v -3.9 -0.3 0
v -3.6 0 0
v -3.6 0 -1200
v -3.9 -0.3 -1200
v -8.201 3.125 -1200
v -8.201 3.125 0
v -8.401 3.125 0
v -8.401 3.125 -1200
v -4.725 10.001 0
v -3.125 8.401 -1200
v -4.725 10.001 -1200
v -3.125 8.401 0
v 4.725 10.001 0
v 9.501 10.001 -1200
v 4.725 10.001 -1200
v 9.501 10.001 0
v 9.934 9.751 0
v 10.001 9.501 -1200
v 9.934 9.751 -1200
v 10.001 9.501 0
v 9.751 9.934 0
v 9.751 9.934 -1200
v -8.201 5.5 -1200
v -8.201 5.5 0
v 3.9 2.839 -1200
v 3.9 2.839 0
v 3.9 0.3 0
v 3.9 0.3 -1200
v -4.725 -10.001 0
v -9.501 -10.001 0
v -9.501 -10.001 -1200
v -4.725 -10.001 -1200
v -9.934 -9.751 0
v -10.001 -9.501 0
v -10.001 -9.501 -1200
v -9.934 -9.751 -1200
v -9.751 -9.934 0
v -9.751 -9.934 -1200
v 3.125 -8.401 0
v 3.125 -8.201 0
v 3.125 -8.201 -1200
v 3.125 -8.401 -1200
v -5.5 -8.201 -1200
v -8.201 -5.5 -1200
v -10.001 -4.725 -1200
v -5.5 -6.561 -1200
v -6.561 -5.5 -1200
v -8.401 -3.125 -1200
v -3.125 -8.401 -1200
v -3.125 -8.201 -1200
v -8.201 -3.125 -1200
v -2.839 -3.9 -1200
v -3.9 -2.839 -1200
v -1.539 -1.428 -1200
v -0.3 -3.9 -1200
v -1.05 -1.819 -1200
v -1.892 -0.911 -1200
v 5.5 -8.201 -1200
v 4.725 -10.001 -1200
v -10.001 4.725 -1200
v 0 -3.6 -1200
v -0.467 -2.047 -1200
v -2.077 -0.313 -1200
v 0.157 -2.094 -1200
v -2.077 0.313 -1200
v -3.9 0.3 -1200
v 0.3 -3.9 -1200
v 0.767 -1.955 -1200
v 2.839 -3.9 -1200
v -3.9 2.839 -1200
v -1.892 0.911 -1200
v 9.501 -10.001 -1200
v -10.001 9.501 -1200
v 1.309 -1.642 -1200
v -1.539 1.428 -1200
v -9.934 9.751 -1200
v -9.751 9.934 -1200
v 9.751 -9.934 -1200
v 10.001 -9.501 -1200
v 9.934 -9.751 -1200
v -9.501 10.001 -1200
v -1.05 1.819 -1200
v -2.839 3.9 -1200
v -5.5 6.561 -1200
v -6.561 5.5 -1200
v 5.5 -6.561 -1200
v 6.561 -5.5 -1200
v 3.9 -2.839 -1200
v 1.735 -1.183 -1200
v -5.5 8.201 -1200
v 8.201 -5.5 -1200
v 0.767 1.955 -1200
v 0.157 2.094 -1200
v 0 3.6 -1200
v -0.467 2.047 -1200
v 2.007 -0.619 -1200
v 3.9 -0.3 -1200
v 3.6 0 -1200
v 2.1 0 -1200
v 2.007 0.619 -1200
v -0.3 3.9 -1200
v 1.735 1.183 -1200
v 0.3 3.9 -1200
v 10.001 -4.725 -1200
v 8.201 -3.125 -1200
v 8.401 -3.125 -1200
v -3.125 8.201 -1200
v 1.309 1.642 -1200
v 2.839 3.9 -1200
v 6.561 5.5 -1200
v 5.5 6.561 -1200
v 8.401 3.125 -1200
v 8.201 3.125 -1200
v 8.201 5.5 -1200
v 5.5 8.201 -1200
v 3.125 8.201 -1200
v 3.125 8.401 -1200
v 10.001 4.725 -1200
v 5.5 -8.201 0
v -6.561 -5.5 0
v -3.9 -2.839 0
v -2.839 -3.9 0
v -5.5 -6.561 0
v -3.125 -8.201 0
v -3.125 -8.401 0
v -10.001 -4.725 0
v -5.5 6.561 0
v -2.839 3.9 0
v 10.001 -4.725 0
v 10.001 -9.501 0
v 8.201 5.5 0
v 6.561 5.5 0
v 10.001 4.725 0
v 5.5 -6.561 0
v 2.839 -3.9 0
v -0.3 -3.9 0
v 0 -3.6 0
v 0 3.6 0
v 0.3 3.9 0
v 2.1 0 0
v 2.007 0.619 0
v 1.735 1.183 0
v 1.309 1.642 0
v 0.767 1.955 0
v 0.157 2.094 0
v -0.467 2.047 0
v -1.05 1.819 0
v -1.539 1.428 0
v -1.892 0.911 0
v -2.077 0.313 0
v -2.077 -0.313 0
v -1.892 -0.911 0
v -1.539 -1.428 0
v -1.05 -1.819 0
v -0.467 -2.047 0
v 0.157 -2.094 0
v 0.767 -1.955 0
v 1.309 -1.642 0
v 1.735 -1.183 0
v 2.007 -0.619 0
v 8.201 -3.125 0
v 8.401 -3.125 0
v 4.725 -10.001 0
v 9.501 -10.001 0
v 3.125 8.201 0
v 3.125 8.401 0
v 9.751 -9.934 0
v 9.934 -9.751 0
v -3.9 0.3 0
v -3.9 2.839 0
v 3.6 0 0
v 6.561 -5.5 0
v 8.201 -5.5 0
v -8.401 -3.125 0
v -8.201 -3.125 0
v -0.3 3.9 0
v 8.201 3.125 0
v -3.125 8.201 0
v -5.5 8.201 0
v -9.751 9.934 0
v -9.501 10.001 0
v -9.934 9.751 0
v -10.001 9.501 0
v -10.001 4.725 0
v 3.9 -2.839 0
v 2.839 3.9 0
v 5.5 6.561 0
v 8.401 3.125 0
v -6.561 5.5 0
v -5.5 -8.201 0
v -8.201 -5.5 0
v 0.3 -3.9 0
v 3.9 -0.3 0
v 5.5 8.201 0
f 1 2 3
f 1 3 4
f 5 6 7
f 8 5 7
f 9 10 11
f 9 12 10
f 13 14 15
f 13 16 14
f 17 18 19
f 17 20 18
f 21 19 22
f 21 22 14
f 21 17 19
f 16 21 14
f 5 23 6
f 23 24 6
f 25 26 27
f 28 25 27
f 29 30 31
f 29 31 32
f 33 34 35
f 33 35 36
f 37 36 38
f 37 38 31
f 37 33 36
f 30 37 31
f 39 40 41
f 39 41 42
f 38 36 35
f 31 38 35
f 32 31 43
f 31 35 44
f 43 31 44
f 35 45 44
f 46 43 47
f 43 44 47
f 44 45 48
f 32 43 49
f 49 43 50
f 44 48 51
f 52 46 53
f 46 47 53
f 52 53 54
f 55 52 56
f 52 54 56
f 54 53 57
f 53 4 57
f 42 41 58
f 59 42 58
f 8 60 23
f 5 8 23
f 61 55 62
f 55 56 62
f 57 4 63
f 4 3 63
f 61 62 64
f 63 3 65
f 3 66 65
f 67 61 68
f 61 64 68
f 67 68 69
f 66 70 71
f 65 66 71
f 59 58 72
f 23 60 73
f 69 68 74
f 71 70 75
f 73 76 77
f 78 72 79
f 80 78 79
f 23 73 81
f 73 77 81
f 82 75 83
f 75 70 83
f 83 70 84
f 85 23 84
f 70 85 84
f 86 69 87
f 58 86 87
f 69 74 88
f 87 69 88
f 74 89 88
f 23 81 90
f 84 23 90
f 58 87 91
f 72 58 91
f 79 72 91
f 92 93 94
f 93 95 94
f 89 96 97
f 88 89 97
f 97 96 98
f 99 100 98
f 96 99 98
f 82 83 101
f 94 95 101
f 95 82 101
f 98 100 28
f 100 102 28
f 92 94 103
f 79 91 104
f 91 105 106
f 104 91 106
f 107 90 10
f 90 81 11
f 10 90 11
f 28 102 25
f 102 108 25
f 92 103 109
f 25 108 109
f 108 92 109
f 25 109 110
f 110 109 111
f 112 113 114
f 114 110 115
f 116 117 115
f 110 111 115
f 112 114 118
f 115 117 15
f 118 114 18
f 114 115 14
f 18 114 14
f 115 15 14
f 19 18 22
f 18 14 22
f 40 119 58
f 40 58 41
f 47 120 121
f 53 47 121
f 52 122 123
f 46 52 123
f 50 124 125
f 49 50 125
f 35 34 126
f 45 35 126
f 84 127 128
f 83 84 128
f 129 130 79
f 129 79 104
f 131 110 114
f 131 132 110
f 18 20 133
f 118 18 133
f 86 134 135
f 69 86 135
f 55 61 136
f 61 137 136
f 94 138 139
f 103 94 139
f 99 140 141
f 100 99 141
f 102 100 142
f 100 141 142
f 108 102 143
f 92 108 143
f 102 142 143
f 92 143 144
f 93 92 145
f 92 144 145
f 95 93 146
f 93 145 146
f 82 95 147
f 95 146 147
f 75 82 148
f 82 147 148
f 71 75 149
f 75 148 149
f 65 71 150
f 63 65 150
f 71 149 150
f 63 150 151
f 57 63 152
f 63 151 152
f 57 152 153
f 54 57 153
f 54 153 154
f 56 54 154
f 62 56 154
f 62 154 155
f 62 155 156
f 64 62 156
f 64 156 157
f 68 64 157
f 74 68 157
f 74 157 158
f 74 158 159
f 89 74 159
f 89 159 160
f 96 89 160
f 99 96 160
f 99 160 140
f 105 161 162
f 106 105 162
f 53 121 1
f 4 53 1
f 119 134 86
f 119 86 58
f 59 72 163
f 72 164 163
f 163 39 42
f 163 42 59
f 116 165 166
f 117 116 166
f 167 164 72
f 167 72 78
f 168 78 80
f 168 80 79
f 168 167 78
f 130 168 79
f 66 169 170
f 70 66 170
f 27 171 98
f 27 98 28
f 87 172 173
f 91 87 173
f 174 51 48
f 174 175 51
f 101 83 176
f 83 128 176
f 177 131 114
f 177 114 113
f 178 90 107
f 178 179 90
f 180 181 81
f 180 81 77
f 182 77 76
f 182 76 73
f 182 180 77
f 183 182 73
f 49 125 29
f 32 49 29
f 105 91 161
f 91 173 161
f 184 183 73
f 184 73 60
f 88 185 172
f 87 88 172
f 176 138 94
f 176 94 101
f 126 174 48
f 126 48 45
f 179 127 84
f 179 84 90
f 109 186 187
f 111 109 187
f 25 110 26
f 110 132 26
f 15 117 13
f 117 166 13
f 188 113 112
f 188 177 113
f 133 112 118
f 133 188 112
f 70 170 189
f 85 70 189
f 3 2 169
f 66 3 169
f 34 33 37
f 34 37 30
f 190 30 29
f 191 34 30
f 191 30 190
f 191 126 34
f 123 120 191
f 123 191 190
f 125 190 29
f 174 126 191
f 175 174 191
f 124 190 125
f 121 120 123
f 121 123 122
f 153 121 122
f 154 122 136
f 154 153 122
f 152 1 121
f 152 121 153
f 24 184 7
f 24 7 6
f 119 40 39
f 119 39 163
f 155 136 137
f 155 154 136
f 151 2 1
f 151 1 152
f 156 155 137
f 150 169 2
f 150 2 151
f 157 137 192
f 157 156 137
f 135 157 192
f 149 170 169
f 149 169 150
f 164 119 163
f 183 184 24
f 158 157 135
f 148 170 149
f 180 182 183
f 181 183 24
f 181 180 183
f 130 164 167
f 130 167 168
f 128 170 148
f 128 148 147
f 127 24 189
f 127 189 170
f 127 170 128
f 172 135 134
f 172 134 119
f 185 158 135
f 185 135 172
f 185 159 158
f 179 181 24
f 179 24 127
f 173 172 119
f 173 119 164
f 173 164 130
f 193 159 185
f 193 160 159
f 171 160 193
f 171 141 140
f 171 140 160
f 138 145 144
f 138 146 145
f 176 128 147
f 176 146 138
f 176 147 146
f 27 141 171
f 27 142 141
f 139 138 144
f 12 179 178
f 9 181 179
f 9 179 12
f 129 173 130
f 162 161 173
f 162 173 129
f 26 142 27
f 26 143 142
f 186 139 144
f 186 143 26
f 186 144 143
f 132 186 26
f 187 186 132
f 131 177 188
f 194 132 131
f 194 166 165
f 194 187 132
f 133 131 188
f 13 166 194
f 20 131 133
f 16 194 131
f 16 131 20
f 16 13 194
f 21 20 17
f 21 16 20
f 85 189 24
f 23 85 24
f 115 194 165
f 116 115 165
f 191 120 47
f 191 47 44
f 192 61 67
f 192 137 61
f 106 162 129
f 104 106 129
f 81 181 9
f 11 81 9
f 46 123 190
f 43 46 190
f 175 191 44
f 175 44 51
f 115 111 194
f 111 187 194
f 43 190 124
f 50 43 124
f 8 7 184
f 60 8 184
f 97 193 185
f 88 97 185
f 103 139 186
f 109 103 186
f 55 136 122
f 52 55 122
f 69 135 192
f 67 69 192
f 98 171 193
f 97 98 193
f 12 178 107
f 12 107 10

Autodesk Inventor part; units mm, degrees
ref_plane "YZ Plane" through (0, 0, 0) normal (1, 0, 0) x (0, 1, 0)
ref_plane "XZ Plane" through (0, 0, 0) normal (0, 1, 0) x (-1, 0, 0)
ref_plane "XY Plane" through (0, 0, 0) normal (0, 0, 1) x (1, 0, 0)
sketch "Sketch2" plane through (0, 0, 0) normal (0, 0, 1) x (1, 0, 0)
  arc A0 (-27.4375, 16.3608) -> (-26.9375, 16.8608) centre (-27.4375, 16.8608) ccw
  line L0 (-45.4375, 36.3608) -> (-46.4375, 36.3608)
  line L1 (-46.9375, 34.8608) -> (-46.9375, 35.8608)
  line L2 (-28.4375, 36.3608) -> (-27.4375, 36.3608)
  line L3 (-26.9375, 17.8608) -> (-26.9375, 16.8608)
  line L4 (-28.4375, 16.3608) -> (-27.4375, 16.3608)
  line L5 (-26.9375, 31.1923) -> (-26.9375, 35.8608)
  line L6 (-46.4375, 16.3608) -> (-41.7689, 16.3608)
  line L7 (-46.9375, 17.8608) -> (-46.9375, 16.8608)
  arc A1 (-46.9375, 16.8608) -> (-46.4375, 16.3608) centre (-46.4375, 16.8608) ccw
  arc A2 (-46.9375, 16.8608) -> (-46.4375, 16.3608) centre (-46.4375, 16.8608) ccw
  arc A3 (-46.4375, 36.3608) -> (-46.9375, 35.8608) centre (-46.4375, 35.8608) ccw
  arc A4 (-26.9375, 35.8608) -> (-27.4375, 36.3608) centre (-27.4375, 35.8608) ccw
  line L8 (-41.5004, 36.2982) -> (-41.5366, 36.3146)
  line L9 (-46.812, 30.8227) -> (-46.8352, 30.855)
  line L10 (-46.9375, 17.8608) -> (-46.9375, 21.4608)
  line L11 (-46.9362, 21.5691) -> (-46.9375, 21.4608)
  line L12 (-46.9258, 21.6478) -> (-46.9323, 21.6086)
  line L13 (-46.9323, 21.6086) -> (-46.9362, 21.5691)
  line L14 (-46.9168, 21.6865) -> (-46.9258, 21.6478)
  line L15 (-46.9053, 21.7245) -> (-46.9168, 21.6865)
  line L16 (-46.8913, 21.7617) -> (-46.9053, 21.7245)
  line L17 (-46.8749, 21.7979) -> (-46.8913, 21.7617)
  line L18 (-46.8561, 21.8329) -> (-46.8749, 21.7979)
  line L19 (-46.812, 21.8989) -> (-46.8352, 21.8667)
  line L20 (-46.8352, 21.8667) -> (-46.8561, 21.8329)
  line L21 (-41.4654, 36.2795) -> (-41.5004, 36.2982)
  line L22 (-46.7868, 21.9297) -> (-46.812, 21.8989)
  line L23 (-46.7597, 21.9586) -> (-46.7868, 21.9297)
  line L24 (-46.7597, 21.9586) -> (-45.2441, 23.4742)
  line L25 (-45.2441, 23.4742) -> (-45.1375, 23.4742)
  line L26 (-45.1375, 23.4742) -> (-45.1375, 20.8608)
  line L27 (-45.1375, 20.8608) -> (-43.4981, 20.8608)
  line L28 (-43.4981, 20.8608) -> (-40.8375, 23.5215)
  line L29 (-46.7868, 30.792) -> (-46.812, 30.8227)
  line L30 (-40.8375, 26.161) -> (-40.8375, 23.5215)
  line L31 (-40.6376, 26.3608) -> (-40.8375, 26.161)
  line L32 (-40.6376, 26.3608) -> (-40.8375, 26.5607)
  line L33 (-40.8375, 29.2002) -> (-40.8375, 26.5607)
  line L34 (-43.4981, 31.8608) -> (-40.8375, 29.2002)
  line L35 (-45.1375, 31.8608) -> (-43.4981, 31.8608)
  line L36 (-45.1375, 29.2475) -> (-45.1375, 31.8608)
  line L37 (-46.7597, 30.763) -> (-46.7868, 30.792)
  line L38 (-45.2441, 29.2475) -> (-45.1375, 29.2475)
  line L39 (-45.2441, 29.2475) -> (-46.7597, 30.763)
  line L40 (-28.7375, 20.8608) -> (-30.3768, 20.8608)
  line L41 (-41.5738, 36.3286) -> (-41.6118, 36.3402)
  line L42 (-41.3687, 36.2102) -> (-41.3994, 36.2354)
  line L43 (-41.3397, 36.183) -> (-41.3687, 36.2102)
  line L44 (-41.6118, 36.3402) -> (-41.6505, 36.3492)
  line L45 (-41.7292, 16.3621) -> (-41.7689, 16.3608)
  line L46 (-41.6897, 16.366) -> (-41.7292, 16.3621)
  line L47 (-41.6505, 16.3725) -> (-41.6897, 16.366)
  line L48 (-41.6118, 16.3815) -> (-41.6505, 16.3725)
  line L49 (-41.5738, 16.3931) -> (-41.6118, 16.3815)
  line L50 (-41.5366, 16.4071) -> (-41.5738, 16.3931)
  line L51 (-42.4375, 32.9215) -> (-39.7768, 30.2608)
  line L52 (-41.5004, 16.4235) -> (-41.5366, 16.4071)
  line L53 (-41.4654, 16.4422) -> (-41.5004, 16.4235)
  line L54 (-41.4317, 16.4632) -> (-41.4654, 16.4422)
  line L55 (-41.3994, 16.4863) -> (-41.4317, 16.4632)
  line L56 (-41.3687, 16.5115) -> (-41.3994, 16.4863)
  line L57 (-41.3397, 16.5386) -> (-41.3687, 16.5115)
  line L58 (-41.3397, 16.5386) -> (-39.8241, 18.0542)
  line L59 (-39.8241, 18.0542) -> (-39.8241, 18.1608)
  line L60 (-39.8241, 18.1608) -> (-42.4375, 18.1608)
  line L61 (-42.4375, 18.1608) -> (-42.4375, 19.8002)
  line L62 (-42.4375, 19.8002) -> (-39.7768, 22.4608)
  line L63 (-39.7768, 22.4608) -> (-37.1444, 22.4608)
  line L64 (-37.1444, 22.4608) -> (-36.9375, 22.6656)
  line L65 (-36.9375, 22.6656) -> (-36.7327, 22.4608)
  line L66 (-36.7327, 22.4608) -> (-34.0981, 22.4608)
  line L67 (-34.0981, 22.4608) -> (-31.4375, 19.8002)
  line L68 (-31.4375, 18.1608) -> (-31.4375, 19.8002)
  line L69 (-41.3397, 36.183) -> (-39.8241, 34.6675)
  line L70 (-34.0508, 18.1608) -> (-31.4375, 18.1608)
  line L71 (-41.6505, 36.3492) -> (-41.6897, 36.3557)
  line L72 (-34.0508, 18.0542) -> (-34.0508, 18.1608)
  line L73 (-34.0508, 18.0542) -> (-32.5353, 16.5387)
  line L74 (-32.5353, 16.5387) -> (-32.5063, 16.5115)
  line L75 (-32.5063, 16.5115) -> (-32.4756, 16.4863)
  line L76 (-32.4756, 16.4863) -> (-32.4433, 16.4632)
  line L77 (-32.4433, 16.4632) -> (-32.4096, 16.4422)
  line L78 (-32.4096, 16.4422) -> (-32.3745, 16.4235)
  line L79 (-32.3745, 16.4235) -> (-32.3383, 16.4071)
  line L80 (-32.3383, 16.4071) -> (-32.3012, 16.3931)
  line L81 (-32.3012, 16.3931) -> (-32.2631, 16.3815)
  line L82 (-32.2631, 16.3815) -> (-32.2245, 16.3725)
  line L83 (-32.2245, 16.3725) -> (-32.1853, 16.366)
  line L84 (-32.1853, 16.366) -> (-32.1457, 16.3621)
  line L85 (-32.1457, 16.3621) -> (-32.106, 16.3608)
  line L86 (-28.4375, 16.3608) -> (-32.106, 16.3608)
  line L87 (-39.8241, 34.6675) -> (-39.8241, 34.5608)
  line L88 (-41.6897, 36.3557) -> (-41.7292, 36.3595)
  line L89 (-26.9375, 17.8608) -> (-26.9375, 21.5294)
  line L90 (-26.9388, 21.5691) -> (-26.9375, 21.5294)
  line L91 (-26.9427, 21.6086) -> (-26.9388, 21.5691)
  line L92 (-26.9491, 21.6478) -> (-26.9427, 21.6086)
  line L93 (-26.9582, 21.6865) -> (-26.9491, 21.6478)
  line L94 (-26.9697, 21.7245) -> (-26.9582, 21.6865)
  line L95 (-26.9837, 21.7617) -> (-26.9697, 21.7245)
  line L96 (-27.0001, 21.7979) -> (-26.9837, 21.7617)
  line L97 (-41.7292, 36.3595) -> (-41.7689, 36.3608)
  line L98 (-27.0188, 21.8329) -> (-27.0001, 21.7979)
  line L99 (-27.0398, 21.8667) -> (-27.0188, 21.8329)
  line L100 (-27.0629, 21.8989) -> (-27.0398, 21.8667)
  line L101 (-27.0881, 21.9297) -> (-27.0629, 21.8989)
  line L102 (-27.1153, 21.9587) -> (-27.0881, 21.9297)
  line L103 (-28.6308, 23.4742) -> (-27.1153, 21.9587)
  line L104 (-28.6308, 23.4742) -> (-28.7375, 23.4742)
  line L105 (-28.7375, 23.4742) -> (-28.7375, 20.8608)
  line L106 (-32.3012, 36.3286) -> (-32.2631, 36.3402)
  line L107 (-30.3768, 20.8608) -> (-33.0375, 23.5215)
  line L108 (-33.0375, 23.5215) -> (-33.0375, 26.161)
  line L109 (-33.2373, 26.3608) -> (-33.0375, 26.161)
  line L110 (-33.2373, 26.3608) -> (-33.0375, 26.5607)
  line L111 (-33.0375, 29.2002) -> (-33.0375, 26.5607)
  line L112 (-30.3768, 31.8608) -> (-33.0375, 29.2002)
  line L113 (-45.4375, 36.3608) -> (-41.7689, 36.3608)
  line L114 (-28.6308, 29.2475) -> (-28.7375, 29.2475)
  line L115 (-28.7375, 31.8608) -> (-30.3768, 31.8608)
  line L116 (-28.7375, 29.2475) -> (-28.7375, 31.8608)
  line L117 (-27.1153, 30.763) -> (-28.6308, 29.2475)
  line L118 (-27.1153, 30.763) -> (-27.0881, 30.792)
  line L119 (-27.0881, 30.792) -> (-27.0629, 30.8227)
  line L120 (-27.0629, 30.8227) -> (-27.0398, 30.855)
  line L121 (-27.0398, 30.855) -> (-27.0188, 30.8888)
  line L122 (-27.0188, 30.8888) -> (-27.0001, 30.9238)
  line L123 (-27.0001, 30.9238) -> (-26.9837, 30.96)
  line L124 (-26.9837, 30.96) -> (-26.9697, 30.9972)
  line L125 (-26.9697, 30.9972) -> (-26.9582, 31.0352)
  line L126 (-26.9582, 31.0352) -> (-26.9491, 31.0739)
  line L127 (-26.9491, 31.0739) -> (-26.9427, 31.1131)
  line L128 (-26.9427, 31.1131) -> (-26.9388, 31.1526)
  line L129 (-26.9388, 31.1526) -> (-26.9375, 31.1923)
  line L130 (-39.8241, 34.5608) -> (-42.4375, 34.5608)
  line L131 (-28.4375, 36.3608) -> (-32.106, 36.3608)
  line L132 (-32.1457, 36.3595) -> (-32.106, 36.3608)
  line L133 (-32.1853, 36.3557) -> (-32.1457, 36.3595)
  line L134 (-32.2631, 36.3402) -> (-32.2245, 36.3492)
  line L135 (-32.3383, 36.3146) -> (-32.3012, 36.3286)
  line L136 (-32.3745, 36.2982) -> (-32.3383, 36.3146)
  line L137 (-32.4096, 36.2795) -> (-32.3745, 36.2982)
  line L138 (-32.4433, 36.2585) -> (-32.4096, 36.2795)
  line L139 (-32.4756, 36.2354) -> (-32.4433, 36.2585)
  line L140 (-32.5063, 36.2102) -> (-32.4756, 36.2354)
  line L141 (-46.9323, 31.1131) -> (-46.9362, 31.1526)
  line L142 (-34.0508, 34.6675) -> (-32.5353, 36.183)
  line L143 (-34.0508, 34.6675) -> (-34.0508, 34.5608)
  line L144 (-34.0508, 34.5608) -> (-31.4375, 34.5608)
  line L145 (-31.4375, 34.5608) -> (-31.4375, 32.9215)
  line L146 (-34.0981, 30.2608) -> (-31.4375, 32.9215)
  line L147 (-34.0981, 30.2608) -> (-36.7327, 30.2608)
  line L148 (-42.4375, 34.5608) -> (-42.4375, 32.9215)
  line L149 (-36.7327, 30.2608) -> (-36.9375, 30.0561)
  line L150 (-37.1422, 30.2608) -> (-36.9375, 30.0561)
  line L151 (-39.7768, 30.2608) -> (-37.1422, 30.2608)
  line L152 (-32.5353, 36.183) -> (-32.5063, 36.2102)
  line L153 (-41.3994, 36.2354) -> (-41.4317, 36.2585)
  line L154 (-46.9258, 31.0739) -> (-46.9323, 31.1131)
  line L155 (-41.4317, 36.2585) -> (-41.4654, 36.2795)
  line L156 (-46.9362, 31.1526) -> (-46.9375, 31.2608)
  line L157 (-46.9168, 31.0352) -> (-46.9258, 31.0739)
  line L158 (-46.9375, 34.8608) -> (-46.9375, 31.2608)
  line L159 (-46.9053, 30.9972) -> (-46.9168, 31.0352)
  line L160 (-46.8913, 30.96) -> (-46.9053, 30.9972)
  line L161 (-46.8749, 30.9238) -> (-46.8913, 30.96)
  line L162 (-46.8561, 30.8888) -> (-46.8749, 30.9238)
  line L163 (-32.2245, 36.3492) -> (-32.1853, 36.3557)
  line L164 (-41.5366, 36.3146) -> (-41.5738, 36.3286)
  line L165 (-46.8352, 30.855) -> (-46.8561, 30.8888)
  circle A5 centre (-36.9375, 26.3608) radius 2.1
  line L166 (3.9, -0.3) -> (3.9, -2.8393)
  line L167 (2.8393, -3.9) -> (0.3, -3.9)
  line L168 (5.5, -6.5607) -> (2.8393, -3.9)
  line L169 (3.9, -2.8393) -> (6.5607, -5.5)
  line L170 (6.5607, -5.5) -> (8.2007, -5.5)
  line L171 (8.2007, -5.5) -> (8.2007, -3.125)
  line L172 (8.2007, -3.125) -> (8.4007, -3.125)
  line L173 (8.4007, -3.125) -> (10.0007, -4.725)
  line L174 (10.0007, -9.5007) -> (10.0007, -4.725)
  line L175 (5.5, -6.5607) -> (5.5, -8.2007)
  line L176 (5.5, -8.2007) -> (3.125, -8.2007)
  line L177 (3.125, -8.2007) -> (3.125, -8.4007)
  line L178 (3.125, -8.4007) -> (4.725, -10.0007)
  line L179 (9.5007, -10.0007) -> (4.725, -10.0007)
  arc A6 (9.5007, -10.0007) -> (10.0007, -9.5007) centre (9.5007, -9.5007) ccw
  line L180 (0, -3.6) -> (0.3, -3.9)
  line L181 (3.6, 0) -> (3.9, -0.3)
  line L182 (3.125, 8.2007) -> (3.125, 8.4007)
  line L183 (0.3, 3.9) -> (2.8393, 3.9)
  line L184 (5.5, 8.2007) -> (3.125, 8.2007)
  line L185 (2.8393, 3.9) -> (5.5, 6.5607)
  line L186 (3.9, 2.8393) -> (3.9, 0.3)
  line L187 (3.6, 0) -> (3.9, 0.3)
  line L188 (6.5607, 5.5) -> (3.9, 2.8393)
  line L189 (5.5, 6.5607) -> (5.5, 8.2007)
  line L190 (3.125, 8.4007) -> (4.725, 10.0007)
  line L191 (6.5607, 5.5) -> (8.2007, 5.5)
  line L192 (8.2007, 5.5) -> (8.2007, 3.125)
  line L193 (8.2007, 3.125) -> (8.4007, 3.125)
  line L194 (8.4007, 3.125) -> (10.0007, 4.725)
  line L195 (9.5007, 10.0007) -> (4.725, 10.0007)
  arc A7 (10.0007, 9.5007) -> (9.5007, 10.0007) centre (9.5007, 9.5007) ccw
  line L196 (10.0007, 9.5007) -> (10.0007, 4.725)
  line L197 (0, 3.6) -> (0.3, 3.9)
  line L198 (-8.2007, 3.125) -> (-8.4007, 3.125)
  line L199 (-3.9, 0.3) -> (-3.9, 2.8393)
  line L200 (-8.2007, 5.5) -> (-8.2007, 3.125)
  line L201 (-3.9, 2.8393) -> (-6.5607, 5.5)
  line L202 (-2.8393, 3.9) -> (-0.3, 3.9)
  line L203 (0, 3.6) -> (-0.3, 3.9)
  line L204 (-5.5, 6.5607) -> (-2.8393, 3.9)
  line L205 (-6.5607, 5.5) -> (-8.2007, 5.5)
  line L206 (-8.4007, 3.125) -> (-10.0007, 4.725)
  line L207 (-5.5, 6.5607) -> (-5.5, 8.2007)
  line L208 (-5.5, 8.2007) -> (-3.125, 8.2007)
  line L209 (-3.125, 8.2007) -> (-3.125, 8.4007)
  line L210 (-3.125, 8.4007) -> (-4.725, 10.0007)
  line L211 (-10.0007, 9.5007) -> (-10.0007, 4.725)
  arc A8 (-9.5007, 10.0007) -> (-10.0007, 9.5007) centre (-9.5007, 9.5007) ccw
  line L212 (-9.5007, 10.0007) -> (-4.725, 10.0007)
  line L213 (-3.6, 0) -> (-3.9, 0.3)
  line L214 (-3.125, -8.2007) -> (-3.125, -8.4007)
  line L215 (-0.3, -3.9) -> (-2.8393, -3.9)
  line L216 (-5.5, -8.2007) -> (-3.125, -8.2007)
  line L217 (-2.8393, -3.9) -> (-5.5, -6.5607)
  line L218 (-3.9, -2.8393) -> (-3.9, -0.3)
  line L219 (-3.6, 0) -> (-3.9, -0.3)
  line L220 (-6.5607, -5.5) -> (-3.9, -2.8393)
  line L221 (-5.5, -6.5607) -> (-5.5, -8.2007)
  line L222 (-3.125, -8.4007) -> (-4.725, -10.0007)
  line L223 (-6.5607, -5.5) -> (-8.2007, -5.5)
  line L224 (-8.2007, -5.5) -> (-8.2007, -3.125)
  line L225 (-8.2007, -3.125) -> (-8.4007, -3.125)
  line L226 (-8.4007, -3.125) -> (-10.0007, -4.725)
  line L227 (-9.5007, -10.0007) -> (-4.725, -10.0007)
  arc A9 (-10.0007, -9.5007) -> (-9.5007, -10.0007) centre (-9.5007, -9.5007) ccw
  line L228 (-10.0007, -9.5007) -> (-10.0007, -4.725)
  line L229 (0, -3.6) -> (-0.3, -3.9)
  circle A10 centre (0, 0) radius 2.1
  point P0 (0, -3.9)
  point P1 (3.9, 0)
  point P2 (3.9, 0)
  point P3 (0, 3.9)
  point P4 (0, 3.9)
  point P5 (3.9, 0)
  point P6 (-3.9, 0)
  point P7 (-3.9, 0)
  point P8 (0, 3.9)
  point P9 (0, -3.9)
  point P10 (0, -3.9)
  point P11 (-3.9, 0)
  dimension "d1" = 4.2
  dimension "d2" = 1.5
  dimension "d4" = 3.9
  dimension "d5" = 3.9
  dimension "d7" = 1.5
  dimension "d9" = 1.64
  dimension "d10" = 135
  dimension "d11" = 1.8
  dimension "d12" = 3.125
  dimension "d13" = 5.5
  dimension "d14" = 45
  dimension "d15" = 0.2
  dimension "d16" = 0.5
  dimension "d17" = 0.3
  dimension "d18" = 0.3
  dimension "d19" = 0.3
  dimension "d20" = 0.3
  dimension "d23" = 360
  dimension "d25" = 4.2
extrude "Extrusion1" add sketch "Sketch2" against normal blind 1200 contours L166 L169 L170 L171 L172 L173 L174 A6 L179 L178 L177 L176 L175 L168 L167 L180 L229 L215 L217 L221 L216 L214 L222 L227 A9 L228 L226 L225 L224 L223 L220 L218 L219 L213 L199 L201 L205 L200 L198 L206 L211 A8 L212 L210 L209 L208 L207 L204 L202 L203 L197 L183 L185 L189 L184 L182 L190 L195 A7 L196 L194 L193 L192 L191 L188 L186 L187 L181
equation "\"d5\" = d4"
equation "\"d18\" = d17"
equation "\"d20\" = d19"
properties part number "v-slot" material "Aluminum 6061"
